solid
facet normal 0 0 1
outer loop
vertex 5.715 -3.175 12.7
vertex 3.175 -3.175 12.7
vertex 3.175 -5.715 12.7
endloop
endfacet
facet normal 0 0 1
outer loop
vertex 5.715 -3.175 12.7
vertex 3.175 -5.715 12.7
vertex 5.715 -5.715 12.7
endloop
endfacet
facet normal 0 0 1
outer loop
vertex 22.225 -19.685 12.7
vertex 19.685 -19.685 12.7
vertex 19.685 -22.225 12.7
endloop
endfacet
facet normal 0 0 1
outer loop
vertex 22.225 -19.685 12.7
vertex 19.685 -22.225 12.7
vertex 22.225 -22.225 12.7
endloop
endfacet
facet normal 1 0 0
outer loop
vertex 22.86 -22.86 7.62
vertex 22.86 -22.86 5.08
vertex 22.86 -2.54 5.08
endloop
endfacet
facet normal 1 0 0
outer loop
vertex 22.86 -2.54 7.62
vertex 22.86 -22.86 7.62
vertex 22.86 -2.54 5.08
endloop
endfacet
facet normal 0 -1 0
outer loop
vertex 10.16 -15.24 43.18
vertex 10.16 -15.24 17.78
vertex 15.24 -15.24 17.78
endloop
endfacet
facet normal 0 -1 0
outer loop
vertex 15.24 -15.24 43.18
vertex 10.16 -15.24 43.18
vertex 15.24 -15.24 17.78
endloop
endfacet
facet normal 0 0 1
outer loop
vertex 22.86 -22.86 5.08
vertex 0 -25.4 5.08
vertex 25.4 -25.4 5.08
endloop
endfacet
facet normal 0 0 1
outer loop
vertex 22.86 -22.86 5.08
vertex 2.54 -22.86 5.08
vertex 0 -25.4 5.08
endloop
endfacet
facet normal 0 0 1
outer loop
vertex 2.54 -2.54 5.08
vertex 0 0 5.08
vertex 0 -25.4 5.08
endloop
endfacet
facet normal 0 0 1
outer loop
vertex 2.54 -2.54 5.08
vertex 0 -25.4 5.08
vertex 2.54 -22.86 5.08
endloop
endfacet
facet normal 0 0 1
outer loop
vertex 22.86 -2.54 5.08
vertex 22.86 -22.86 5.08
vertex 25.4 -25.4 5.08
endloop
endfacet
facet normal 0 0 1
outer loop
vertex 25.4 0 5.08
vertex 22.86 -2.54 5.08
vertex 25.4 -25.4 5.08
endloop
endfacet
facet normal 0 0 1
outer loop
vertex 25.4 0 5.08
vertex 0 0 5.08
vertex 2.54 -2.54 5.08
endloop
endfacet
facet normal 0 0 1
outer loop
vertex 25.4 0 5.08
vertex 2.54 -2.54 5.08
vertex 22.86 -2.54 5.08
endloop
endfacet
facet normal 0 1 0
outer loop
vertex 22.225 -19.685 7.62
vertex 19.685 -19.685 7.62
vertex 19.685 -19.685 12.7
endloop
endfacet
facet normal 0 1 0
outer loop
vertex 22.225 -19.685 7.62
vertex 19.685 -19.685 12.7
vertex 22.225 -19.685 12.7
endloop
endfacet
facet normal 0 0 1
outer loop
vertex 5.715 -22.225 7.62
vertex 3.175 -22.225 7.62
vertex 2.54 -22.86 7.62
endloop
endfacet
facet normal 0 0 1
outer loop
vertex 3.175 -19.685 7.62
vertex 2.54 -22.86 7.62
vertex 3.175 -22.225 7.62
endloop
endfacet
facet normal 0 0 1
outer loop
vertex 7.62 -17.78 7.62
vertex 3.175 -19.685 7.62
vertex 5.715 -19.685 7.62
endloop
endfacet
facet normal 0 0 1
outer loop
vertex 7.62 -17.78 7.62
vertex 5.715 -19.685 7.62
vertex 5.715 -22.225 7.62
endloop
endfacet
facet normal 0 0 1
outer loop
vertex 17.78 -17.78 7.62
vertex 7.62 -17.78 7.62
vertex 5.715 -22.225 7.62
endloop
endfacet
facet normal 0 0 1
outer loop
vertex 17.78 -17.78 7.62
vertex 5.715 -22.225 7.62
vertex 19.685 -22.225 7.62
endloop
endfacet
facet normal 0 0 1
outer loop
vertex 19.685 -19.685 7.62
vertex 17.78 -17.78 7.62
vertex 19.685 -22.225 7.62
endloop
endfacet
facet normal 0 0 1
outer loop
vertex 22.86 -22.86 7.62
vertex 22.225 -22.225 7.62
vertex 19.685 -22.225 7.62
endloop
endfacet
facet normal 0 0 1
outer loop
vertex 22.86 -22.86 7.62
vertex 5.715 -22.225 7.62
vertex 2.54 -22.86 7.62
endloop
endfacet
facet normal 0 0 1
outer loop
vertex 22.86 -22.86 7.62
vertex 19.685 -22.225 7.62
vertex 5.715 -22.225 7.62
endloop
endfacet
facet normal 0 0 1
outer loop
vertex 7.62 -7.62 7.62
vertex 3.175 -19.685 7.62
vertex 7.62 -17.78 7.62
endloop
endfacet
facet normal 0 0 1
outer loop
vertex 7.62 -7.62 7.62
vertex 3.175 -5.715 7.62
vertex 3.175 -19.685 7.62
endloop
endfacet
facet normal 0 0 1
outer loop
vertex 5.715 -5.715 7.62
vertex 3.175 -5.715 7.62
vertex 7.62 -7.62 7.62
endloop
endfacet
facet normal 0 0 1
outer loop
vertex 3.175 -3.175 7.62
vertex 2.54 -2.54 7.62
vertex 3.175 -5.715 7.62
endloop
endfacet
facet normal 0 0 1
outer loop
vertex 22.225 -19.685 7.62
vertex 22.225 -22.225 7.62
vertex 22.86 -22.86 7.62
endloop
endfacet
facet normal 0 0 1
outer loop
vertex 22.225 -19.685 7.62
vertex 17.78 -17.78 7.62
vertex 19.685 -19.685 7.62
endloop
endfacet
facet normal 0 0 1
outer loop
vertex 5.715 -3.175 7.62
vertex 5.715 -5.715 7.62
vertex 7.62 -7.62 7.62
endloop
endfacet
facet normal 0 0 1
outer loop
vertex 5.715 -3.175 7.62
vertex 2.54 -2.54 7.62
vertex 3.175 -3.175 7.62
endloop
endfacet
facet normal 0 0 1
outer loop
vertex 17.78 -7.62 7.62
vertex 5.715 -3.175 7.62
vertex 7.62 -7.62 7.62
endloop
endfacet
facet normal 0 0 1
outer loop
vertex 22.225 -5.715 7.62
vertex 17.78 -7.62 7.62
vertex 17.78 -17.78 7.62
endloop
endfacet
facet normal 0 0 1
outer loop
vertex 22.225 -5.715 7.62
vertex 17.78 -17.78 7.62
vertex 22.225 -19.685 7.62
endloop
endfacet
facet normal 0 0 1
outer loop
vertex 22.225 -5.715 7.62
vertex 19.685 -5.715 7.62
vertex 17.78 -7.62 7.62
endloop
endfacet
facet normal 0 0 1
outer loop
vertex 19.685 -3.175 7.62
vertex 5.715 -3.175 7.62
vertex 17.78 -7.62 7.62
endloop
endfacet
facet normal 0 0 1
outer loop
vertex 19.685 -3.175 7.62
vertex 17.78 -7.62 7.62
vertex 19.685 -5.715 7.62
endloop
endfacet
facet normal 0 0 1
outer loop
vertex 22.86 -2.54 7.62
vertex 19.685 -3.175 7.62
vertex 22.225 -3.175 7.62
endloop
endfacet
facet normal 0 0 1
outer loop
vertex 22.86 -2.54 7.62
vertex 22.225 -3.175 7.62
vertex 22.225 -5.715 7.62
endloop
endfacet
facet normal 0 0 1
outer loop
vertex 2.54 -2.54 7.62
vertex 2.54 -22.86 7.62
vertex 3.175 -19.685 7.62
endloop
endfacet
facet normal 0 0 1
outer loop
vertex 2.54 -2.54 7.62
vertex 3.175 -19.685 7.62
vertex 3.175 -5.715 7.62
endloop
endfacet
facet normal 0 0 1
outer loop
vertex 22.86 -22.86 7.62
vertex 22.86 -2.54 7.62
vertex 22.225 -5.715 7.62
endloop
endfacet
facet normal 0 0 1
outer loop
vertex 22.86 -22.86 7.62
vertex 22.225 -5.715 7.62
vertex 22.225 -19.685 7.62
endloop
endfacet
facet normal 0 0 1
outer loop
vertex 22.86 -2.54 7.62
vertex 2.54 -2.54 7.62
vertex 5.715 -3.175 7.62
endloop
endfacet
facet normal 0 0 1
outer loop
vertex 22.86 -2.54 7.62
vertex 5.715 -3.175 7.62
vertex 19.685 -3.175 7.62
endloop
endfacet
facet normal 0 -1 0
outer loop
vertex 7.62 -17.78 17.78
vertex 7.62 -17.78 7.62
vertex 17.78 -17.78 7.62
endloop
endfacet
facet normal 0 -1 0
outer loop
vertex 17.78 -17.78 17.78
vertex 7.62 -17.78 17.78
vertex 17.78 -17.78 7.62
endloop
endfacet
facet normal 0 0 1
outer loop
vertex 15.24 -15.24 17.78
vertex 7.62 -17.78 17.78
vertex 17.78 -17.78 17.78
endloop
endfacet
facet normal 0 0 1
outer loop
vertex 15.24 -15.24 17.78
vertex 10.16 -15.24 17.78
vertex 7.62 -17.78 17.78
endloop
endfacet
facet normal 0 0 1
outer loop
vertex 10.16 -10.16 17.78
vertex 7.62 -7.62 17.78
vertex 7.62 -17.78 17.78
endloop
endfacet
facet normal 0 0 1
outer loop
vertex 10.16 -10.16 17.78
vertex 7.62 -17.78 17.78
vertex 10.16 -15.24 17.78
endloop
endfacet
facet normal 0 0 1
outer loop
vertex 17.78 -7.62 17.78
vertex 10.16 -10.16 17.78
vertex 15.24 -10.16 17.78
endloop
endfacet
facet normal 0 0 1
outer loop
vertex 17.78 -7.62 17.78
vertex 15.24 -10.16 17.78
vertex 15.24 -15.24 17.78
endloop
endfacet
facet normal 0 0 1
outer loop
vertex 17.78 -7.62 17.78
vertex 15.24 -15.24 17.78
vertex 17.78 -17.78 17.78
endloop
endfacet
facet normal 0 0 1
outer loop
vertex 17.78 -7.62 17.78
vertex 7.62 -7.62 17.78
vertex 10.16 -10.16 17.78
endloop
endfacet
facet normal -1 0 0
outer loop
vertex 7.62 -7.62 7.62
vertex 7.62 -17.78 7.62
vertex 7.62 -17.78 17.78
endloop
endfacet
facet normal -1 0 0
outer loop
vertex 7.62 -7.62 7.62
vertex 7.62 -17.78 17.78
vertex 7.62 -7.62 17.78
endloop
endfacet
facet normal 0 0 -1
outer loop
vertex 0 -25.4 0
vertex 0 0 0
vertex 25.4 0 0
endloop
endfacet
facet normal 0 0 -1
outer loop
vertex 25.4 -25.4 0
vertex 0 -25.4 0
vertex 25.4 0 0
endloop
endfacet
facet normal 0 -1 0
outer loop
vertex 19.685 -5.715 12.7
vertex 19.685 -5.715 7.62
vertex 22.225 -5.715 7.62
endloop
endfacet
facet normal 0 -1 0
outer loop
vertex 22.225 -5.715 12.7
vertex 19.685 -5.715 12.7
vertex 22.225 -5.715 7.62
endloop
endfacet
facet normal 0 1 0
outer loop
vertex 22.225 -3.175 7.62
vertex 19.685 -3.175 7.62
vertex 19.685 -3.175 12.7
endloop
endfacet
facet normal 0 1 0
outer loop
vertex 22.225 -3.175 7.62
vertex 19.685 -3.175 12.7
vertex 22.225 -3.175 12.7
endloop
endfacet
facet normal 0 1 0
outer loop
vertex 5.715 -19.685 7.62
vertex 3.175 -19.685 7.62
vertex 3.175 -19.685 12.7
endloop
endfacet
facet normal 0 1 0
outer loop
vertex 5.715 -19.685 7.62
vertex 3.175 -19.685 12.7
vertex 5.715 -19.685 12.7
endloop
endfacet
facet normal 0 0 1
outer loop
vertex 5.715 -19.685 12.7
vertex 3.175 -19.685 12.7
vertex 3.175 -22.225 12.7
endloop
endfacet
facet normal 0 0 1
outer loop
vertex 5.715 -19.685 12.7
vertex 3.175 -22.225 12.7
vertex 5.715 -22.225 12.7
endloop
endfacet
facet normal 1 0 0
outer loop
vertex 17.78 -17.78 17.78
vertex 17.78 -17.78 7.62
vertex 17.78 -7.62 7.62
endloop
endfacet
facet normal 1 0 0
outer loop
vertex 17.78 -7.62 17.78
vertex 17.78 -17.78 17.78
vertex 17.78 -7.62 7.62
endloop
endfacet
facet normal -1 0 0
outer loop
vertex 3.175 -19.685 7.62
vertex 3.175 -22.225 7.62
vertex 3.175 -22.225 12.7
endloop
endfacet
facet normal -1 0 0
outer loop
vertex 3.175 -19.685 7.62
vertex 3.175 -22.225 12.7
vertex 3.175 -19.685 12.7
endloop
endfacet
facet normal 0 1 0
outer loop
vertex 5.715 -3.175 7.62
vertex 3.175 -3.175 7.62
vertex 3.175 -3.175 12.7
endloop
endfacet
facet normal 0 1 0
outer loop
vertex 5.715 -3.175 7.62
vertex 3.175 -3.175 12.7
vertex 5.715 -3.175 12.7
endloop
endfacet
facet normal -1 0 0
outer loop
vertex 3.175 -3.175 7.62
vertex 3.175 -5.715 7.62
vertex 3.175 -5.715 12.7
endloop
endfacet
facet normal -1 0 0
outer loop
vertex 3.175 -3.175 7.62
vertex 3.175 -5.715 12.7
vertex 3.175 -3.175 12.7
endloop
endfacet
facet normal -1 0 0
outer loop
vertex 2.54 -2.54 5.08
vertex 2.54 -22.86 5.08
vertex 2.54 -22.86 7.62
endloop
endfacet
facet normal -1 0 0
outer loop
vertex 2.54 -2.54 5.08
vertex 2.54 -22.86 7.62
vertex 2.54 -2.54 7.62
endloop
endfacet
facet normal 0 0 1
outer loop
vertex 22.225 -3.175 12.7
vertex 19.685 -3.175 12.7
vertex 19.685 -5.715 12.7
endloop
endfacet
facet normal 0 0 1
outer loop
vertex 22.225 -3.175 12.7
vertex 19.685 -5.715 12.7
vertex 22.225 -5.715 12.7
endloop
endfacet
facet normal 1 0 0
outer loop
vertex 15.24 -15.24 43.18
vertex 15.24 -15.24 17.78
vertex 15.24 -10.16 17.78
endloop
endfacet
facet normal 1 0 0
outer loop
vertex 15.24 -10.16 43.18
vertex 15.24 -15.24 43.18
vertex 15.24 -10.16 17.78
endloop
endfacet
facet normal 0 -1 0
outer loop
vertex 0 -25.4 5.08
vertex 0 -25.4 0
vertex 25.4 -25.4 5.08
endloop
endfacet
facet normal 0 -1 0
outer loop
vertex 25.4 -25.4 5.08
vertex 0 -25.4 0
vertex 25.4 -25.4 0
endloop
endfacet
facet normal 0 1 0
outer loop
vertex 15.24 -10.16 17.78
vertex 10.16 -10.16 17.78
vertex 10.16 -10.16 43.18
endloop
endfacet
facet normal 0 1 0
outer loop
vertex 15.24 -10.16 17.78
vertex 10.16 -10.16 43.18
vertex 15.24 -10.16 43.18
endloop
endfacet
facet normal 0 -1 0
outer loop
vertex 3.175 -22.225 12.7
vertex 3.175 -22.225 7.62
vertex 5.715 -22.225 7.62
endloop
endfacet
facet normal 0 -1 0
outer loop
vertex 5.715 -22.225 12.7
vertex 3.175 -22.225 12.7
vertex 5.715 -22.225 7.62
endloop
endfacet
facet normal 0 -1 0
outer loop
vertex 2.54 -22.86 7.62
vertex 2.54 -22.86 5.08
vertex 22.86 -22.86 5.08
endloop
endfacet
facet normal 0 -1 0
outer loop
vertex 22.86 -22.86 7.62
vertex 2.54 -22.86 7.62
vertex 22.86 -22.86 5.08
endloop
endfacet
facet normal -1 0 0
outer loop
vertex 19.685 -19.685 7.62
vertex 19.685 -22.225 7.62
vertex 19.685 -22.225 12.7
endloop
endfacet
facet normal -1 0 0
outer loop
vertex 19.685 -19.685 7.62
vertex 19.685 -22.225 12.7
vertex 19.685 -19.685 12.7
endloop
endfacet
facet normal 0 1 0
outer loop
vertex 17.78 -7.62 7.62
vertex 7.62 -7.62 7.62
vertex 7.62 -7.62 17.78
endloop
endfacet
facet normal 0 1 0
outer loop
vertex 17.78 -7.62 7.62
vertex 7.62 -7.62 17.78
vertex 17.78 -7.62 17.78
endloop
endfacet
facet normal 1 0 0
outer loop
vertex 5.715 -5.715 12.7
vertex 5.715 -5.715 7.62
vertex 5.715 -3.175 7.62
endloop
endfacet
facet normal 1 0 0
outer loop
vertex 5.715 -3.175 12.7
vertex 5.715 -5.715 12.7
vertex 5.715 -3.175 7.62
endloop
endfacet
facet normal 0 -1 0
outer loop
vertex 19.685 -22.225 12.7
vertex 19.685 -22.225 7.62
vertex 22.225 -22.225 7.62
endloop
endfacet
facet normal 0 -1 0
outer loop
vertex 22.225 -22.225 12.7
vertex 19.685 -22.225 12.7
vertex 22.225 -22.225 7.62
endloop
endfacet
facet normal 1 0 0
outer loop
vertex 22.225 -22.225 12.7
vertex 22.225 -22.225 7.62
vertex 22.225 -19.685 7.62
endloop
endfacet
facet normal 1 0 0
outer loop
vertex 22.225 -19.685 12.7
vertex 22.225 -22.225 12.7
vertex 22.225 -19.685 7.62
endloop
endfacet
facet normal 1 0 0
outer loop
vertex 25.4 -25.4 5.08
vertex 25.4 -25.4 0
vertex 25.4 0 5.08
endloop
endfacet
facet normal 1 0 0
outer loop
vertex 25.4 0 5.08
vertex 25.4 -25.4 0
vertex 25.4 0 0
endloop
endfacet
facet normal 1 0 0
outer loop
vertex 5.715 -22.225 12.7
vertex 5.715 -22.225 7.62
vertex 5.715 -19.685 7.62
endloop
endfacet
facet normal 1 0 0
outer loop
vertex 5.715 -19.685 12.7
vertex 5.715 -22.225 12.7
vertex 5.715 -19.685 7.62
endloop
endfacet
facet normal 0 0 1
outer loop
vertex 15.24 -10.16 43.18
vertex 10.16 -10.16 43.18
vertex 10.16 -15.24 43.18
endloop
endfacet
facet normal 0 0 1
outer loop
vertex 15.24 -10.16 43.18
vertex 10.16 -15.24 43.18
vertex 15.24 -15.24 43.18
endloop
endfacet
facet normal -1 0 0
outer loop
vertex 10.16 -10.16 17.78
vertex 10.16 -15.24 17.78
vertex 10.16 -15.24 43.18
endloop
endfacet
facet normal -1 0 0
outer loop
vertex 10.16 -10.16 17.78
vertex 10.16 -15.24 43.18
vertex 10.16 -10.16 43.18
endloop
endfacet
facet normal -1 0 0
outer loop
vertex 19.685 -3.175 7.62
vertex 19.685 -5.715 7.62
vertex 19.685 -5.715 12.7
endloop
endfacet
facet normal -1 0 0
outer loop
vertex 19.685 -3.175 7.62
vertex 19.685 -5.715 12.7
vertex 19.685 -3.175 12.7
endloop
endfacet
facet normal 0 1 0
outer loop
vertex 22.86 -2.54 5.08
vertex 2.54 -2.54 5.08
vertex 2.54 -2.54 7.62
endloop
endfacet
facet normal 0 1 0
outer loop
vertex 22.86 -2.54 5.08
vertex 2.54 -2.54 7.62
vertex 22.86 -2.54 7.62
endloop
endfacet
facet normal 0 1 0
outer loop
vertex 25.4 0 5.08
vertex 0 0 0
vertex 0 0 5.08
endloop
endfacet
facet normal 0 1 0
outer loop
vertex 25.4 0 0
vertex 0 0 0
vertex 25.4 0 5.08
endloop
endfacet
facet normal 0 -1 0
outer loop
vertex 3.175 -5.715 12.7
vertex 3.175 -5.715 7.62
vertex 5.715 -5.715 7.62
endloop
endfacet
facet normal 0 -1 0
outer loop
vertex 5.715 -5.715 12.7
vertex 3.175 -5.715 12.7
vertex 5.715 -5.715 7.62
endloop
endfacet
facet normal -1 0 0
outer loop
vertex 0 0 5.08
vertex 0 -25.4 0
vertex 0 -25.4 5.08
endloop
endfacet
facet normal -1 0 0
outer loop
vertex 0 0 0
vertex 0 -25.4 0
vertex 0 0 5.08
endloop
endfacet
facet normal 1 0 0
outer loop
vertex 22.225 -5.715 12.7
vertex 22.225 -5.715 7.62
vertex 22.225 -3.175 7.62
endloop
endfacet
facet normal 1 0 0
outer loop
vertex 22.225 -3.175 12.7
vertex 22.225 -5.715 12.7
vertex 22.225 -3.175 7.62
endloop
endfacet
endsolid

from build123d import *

# Parameters (mm, degrees)
F0_W      = 25.4
F0_H      = 25.4
F1_DEPTH  = 5.08
F2_W      = 20.32
F2_H      = 20.32
F3_DEPTH  = 2.54
F4_W      = 10.16
F4_H      = 10.16
F5_DEPTH  = 10.16
F6_W      = 5.08
F6_H      = 5.08
F7_DEPTH  = 25.4
F8_W      = 2.54
F8_H      = 2.54
F9_DEPTH  = 5.08
F10_R     = 0.635
F11_DEPTH = 0.254
F13_R     = 2.2046300475
F14_DEPTH = 25.4


# Not quite as in the source:
# - a fillet or chamfer that OpenCascade refuses, or shapes differently, is made with other operations: its cross-section is extruded or revolved along the edge and cut away or added


with BuildPart() as f1:
    # F0 (on Top) → F1 (new body)
    with BuildSketch(Plane.XY):
        with Locations((12.7, -12.7)):
            Rectangle(F0_W, F0_H)
    extrude(amount=F1_DEPTH)

    # F2 (on face) → F3 (join)
    with BuildSketch(Plane.XY.offset(5.08)):
        with Locations((12.7, -12.7)):
            Rectangle(F2_W, F2_H)
    extrude(amount=F3_DEPTH)

    # F4 (on face) → F5 (join)
    with BuildSketch(Plane.XY.offset(7.62)):
        with Locations((12.7, -12.7)):
            Rectangle(F4_W, F4_H)
    extrude(amount=F5_DEPTH)

    # F6 (on face) → F7 (join)
    with BuildSketch(Plane.XY.offset(17.78)):
        with Locations((12.7, -12.7)):
            Rectangle(F6_W, F6_H)
    extrude(amount=F7_DEPTH)

    # F8 (on face) → F9 (join)
    with BuildSketch(Plane.XY.offset(7.62)):
        with Locations((4.445, -4.445)):
            Rectangle(F8_W, F8_H)
        with Locations((20.955, -4.445)):
            Rectangle(F8_W, F8_H)
        with Locations((20.955, -20.955)):
            Rectangle(F8_W, F8_H)
        with Locations((4.445, -20.955)):
            Rectangle(F8_W, F8_H)
    extrude(amount=F9_DEPTH)

    # F10 (on face) → F11 (join)
    with BuildSketch(Plane.XZ.offset(22.225)):
        with Locations((4.445, 11.43)):
            Circle(F10_R)
    extrude(amount=F11_DEPTH)

    # F12: fillet of radius 0.8636 on 1 edges, made by hand


with BuildPart() as f12_tool2:
    # F12_s3 → F12_t4 (revolve)
    with BuildSketch(Plane.XY.offset(11.43)):
        with BuildLine():
            ThreePointArc((5.08, -21.6154), (4.9031400964, -22.1390344145), (4.445, -22.4481946926))
            Line((4.445, -22.4481946926), (4.445, -22.479))
            Line((4.445, -22.479), (5.08, -22.479))
            Line((5.08, -22.479), (5.08, -21.6154))
        make_face()
    revolve(axis=Axis((4.445, -22.479, 11.43), (0, -1, 0)))

    split(bisect_by=Plane.XZ.offset(22.225), keep=Keep.TOP)


with BuildPart() as f1_1:
    add(f1.part)

    # F12_t1: cut F12_tool2
    add(f12_tool2.part, mode=Mode.SUBTRACT)

    # F13 (on face) → F14 (cut)
    with BuildSketch(Plane.XZ.offset(22.225)):
        with Locations((4.445, 11.43)):
            Circle(F13_R)
    extrude(amount=F14_DEPTH, mode=Mode.SUBTRACT)


solid = f1_1.part
